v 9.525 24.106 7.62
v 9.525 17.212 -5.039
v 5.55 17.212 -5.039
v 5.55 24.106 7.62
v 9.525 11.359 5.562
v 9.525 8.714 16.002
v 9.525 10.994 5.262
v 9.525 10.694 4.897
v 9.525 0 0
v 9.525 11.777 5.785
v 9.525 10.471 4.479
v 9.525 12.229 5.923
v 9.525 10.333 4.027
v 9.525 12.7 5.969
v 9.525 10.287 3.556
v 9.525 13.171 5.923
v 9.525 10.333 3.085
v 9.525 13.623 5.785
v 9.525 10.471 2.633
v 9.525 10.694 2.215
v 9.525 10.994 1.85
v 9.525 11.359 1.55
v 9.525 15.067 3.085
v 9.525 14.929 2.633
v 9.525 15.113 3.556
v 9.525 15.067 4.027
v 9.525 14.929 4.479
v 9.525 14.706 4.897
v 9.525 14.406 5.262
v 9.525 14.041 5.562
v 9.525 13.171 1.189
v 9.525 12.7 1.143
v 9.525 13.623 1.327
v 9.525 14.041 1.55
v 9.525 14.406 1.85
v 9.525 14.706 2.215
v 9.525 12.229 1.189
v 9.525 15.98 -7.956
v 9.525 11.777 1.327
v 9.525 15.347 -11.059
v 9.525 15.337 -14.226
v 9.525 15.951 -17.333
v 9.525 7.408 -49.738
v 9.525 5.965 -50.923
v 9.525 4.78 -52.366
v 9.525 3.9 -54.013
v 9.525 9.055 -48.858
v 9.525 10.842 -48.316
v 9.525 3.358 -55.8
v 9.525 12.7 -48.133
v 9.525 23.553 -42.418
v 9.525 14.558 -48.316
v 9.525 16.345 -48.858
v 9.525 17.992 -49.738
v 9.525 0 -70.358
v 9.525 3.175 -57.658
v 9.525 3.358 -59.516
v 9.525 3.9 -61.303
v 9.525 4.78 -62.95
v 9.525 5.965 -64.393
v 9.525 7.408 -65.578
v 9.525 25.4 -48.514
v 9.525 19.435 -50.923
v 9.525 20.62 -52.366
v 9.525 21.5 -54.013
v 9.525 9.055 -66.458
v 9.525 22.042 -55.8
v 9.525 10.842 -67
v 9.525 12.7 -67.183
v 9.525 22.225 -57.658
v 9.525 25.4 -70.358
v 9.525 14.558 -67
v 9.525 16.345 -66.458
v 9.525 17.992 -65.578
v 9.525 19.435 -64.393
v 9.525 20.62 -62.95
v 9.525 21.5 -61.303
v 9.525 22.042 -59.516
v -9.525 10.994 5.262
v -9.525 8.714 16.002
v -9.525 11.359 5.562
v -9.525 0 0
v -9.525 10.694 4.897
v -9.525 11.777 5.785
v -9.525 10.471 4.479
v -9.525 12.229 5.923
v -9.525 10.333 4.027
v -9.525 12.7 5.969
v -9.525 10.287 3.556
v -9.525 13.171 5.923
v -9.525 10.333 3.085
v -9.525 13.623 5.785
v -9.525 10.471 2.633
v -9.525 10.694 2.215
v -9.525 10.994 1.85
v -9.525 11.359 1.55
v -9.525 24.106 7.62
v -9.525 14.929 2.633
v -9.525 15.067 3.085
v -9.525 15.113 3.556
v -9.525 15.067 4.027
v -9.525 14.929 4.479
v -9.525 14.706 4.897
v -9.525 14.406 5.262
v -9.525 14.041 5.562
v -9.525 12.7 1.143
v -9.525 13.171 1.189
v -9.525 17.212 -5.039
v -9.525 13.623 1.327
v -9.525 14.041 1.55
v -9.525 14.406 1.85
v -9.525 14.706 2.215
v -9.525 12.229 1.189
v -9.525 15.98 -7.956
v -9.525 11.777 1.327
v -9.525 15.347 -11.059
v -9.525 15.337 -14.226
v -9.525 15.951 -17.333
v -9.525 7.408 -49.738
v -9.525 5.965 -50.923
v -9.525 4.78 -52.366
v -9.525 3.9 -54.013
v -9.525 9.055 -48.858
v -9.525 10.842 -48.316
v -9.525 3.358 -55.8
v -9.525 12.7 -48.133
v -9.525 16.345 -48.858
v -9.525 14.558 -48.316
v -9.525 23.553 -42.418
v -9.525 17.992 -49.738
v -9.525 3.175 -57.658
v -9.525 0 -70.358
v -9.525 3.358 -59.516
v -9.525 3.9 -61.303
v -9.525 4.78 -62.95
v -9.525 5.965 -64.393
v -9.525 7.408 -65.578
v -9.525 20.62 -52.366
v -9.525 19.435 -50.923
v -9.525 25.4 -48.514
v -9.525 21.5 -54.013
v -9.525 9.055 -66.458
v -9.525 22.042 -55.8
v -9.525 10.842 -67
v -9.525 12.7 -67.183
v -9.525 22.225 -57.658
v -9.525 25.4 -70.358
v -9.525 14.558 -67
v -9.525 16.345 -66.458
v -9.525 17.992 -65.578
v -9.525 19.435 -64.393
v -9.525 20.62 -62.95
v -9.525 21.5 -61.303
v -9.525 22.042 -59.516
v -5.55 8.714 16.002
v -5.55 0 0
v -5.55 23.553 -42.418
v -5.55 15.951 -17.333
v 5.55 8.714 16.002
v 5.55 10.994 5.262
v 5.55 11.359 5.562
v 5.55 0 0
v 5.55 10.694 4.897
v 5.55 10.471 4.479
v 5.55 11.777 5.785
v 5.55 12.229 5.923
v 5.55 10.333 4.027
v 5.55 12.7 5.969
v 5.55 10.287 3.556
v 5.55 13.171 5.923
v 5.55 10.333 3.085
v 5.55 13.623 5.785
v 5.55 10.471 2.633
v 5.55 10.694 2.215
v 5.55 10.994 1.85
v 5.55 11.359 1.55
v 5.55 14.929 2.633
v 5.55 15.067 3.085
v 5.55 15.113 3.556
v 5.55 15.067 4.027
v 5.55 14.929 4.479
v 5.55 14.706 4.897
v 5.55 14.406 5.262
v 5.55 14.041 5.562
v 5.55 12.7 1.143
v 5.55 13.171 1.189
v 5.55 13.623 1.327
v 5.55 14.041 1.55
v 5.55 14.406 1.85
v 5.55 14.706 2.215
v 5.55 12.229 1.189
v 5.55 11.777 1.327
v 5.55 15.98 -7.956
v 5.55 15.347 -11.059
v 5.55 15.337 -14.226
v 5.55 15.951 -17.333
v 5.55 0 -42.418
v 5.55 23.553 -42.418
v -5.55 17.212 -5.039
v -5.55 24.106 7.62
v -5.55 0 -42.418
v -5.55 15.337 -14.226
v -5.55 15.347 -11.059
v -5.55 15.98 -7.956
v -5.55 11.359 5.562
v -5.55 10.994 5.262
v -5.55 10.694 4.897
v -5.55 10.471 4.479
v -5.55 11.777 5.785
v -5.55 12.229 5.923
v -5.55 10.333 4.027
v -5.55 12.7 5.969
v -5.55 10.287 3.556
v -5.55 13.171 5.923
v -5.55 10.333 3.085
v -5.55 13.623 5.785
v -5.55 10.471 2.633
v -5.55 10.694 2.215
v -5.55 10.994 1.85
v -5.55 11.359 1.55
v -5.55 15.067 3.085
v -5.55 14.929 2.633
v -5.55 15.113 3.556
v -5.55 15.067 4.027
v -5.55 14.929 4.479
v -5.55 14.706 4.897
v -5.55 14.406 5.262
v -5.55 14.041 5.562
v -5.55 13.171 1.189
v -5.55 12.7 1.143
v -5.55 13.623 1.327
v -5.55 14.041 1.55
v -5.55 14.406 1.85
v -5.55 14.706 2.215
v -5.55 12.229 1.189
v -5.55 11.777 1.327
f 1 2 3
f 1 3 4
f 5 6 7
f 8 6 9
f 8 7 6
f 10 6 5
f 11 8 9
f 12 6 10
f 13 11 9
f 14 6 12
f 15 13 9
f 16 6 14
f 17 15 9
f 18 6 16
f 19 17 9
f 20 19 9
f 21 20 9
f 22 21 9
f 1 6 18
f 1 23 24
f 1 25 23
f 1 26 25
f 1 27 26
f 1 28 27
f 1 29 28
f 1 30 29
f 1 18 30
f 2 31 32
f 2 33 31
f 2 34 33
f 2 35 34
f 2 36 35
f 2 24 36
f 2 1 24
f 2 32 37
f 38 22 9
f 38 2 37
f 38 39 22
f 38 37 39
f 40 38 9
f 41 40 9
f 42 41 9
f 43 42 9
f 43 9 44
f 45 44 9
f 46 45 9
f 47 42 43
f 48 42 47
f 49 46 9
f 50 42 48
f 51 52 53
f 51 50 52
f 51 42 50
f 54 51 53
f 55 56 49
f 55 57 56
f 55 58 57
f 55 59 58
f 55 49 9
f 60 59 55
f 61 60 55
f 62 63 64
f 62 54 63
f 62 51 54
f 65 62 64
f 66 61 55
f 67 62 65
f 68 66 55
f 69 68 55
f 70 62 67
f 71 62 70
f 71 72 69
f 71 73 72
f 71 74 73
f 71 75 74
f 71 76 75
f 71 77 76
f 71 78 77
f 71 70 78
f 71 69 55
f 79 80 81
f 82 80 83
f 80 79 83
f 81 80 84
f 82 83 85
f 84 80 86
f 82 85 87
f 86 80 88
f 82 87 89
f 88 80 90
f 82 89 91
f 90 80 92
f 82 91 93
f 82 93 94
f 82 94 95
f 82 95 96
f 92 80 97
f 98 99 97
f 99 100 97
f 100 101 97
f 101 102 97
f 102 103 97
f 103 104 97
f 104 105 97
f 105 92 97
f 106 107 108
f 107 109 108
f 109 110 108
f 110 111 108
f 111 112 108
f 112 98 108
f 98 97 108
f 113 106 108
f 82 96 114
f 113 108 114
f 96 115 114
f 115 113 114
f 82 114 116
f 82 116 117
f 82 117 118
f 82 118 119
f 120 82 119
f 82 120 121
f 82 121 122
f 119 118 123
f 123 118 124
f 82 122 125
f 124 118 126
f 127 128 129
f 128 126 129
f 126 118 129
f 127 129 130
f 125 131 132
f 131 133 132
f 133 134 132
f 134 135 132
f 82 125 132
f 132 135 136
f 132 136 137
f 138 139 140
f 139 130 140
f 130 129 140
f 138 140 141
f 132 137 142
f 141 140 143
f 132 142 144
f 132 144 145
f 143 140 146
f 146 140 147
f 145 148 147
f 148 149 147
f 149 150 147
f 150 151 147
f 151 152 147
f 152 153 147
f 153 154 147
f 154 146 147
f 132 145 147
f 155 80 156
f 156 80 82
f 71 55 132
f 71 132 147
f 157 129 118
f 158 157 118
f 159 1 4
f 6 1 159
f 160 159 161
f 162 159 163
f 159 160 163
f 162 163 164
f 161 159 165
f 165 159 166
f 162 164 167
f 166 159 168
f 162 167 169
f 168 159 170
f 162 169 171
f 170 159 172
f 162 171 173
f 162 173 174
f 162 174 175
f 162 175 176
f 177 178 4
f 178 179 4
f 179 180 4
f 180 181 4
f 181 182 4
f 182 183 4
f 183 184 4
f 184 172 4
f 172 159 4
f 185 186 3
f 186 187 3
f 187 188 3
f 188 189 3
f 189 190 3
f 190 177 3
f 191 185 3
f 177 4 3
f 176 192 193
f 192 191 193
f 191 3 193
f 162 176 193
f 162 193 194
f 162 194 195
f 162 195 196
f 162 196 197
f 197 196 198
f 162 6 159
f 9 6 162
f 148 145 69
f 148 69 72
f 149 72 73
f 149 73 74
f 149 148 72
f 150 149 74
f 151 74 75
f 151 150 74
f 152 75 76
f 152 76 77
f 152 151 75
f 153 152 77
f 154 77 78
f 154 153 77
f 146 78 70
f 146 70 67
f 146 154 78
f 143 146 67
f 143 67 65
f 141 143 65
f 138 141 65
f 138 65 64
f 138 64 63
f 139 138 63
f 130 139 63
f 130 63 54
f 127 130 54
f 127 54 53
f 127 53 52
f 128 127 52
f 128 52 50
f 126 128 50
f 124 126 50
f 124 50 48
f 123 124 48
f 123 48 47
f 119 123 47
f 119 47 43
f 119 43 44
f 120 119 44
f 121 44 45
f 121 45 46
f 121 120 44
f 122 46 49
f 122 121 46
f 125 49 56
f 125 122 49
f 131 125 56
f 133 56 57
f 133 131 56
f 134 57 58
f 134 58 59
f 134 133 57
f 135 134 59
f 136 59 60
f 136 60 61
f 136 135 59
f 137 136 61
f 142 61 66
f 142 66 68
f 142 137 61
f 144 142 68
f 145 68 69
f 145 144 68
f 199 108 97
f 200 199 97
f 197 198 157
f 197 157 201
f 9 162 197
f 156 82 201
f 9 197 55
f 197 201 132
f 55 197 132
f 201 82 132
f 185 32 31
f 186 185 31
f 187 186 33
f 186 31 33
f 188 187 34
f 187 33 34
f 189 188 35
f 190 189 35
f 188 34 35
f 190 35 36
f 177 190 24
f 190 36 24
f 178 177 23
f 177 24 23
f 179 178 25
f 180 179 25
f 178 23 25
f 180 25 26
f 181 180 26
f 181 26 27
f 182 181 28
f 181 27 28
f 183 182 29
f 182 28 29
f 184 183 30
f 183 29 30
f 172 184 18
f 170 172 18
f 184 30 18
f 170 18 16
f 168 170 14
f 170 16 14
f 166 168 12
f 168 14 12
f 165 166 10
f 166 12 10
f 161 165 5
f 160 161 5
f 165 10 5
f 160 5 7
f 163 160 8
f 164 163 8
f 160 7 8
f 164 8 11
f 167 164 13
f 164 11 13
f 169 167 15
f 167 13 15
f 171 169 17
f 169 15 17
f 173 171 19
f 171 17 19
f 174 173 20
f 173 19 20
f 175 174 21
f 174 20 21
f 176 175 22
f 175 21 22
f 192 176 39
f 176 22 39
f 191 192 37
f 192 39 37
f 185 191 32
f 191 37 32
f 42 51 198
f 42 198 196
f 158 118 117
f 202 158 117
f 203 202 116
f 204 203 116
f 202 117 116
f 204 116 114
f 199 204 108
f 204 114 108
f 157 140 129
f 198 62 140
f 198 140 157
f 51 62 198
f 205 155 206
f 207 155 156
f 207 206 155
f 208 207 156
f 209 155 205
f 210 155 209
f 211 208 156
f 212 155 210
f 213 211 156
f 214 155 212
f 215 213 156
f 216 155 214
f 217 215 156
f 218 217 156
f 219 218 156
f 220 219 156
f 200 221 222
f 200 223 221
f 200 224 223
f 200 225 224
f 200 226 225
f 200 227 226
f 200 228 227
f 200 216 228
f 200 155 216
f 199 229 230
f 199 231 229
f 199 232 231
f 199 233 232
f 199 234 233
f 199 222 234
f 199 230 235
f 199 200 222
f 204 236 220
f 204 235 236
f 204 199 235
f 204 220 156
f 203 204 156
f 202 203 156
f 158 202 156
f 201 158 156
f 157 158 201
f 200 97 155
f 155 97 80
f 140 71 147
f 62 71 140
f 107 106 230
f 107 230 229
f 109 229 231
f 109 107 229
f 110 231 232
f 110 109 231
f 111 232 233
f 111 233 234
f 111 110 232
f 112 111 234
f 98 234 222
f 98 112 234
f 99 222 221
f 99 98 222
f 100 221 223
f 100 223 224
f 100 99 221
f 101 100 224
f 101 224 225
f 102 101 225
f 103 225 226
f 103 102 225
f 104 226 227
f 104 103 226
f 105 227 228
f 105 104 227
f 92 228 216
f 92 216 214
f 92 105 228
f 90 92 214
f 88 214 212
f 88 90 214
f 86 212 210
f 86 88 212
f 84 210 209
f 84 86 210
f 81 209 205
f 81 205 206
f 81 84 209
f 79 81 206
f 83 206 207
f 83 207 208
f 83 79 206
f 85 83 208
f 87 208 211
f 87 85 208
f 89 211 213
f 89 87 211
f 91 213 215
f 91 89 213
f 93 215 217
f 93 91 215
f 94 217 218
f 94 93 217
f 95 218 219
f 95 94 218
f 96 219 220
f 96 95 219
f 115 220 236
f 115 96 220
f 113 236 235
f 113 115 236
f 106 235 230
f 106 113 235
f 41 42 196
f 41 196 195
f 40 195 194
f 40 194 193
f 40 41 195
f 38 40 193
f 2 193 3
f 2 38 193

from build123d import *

# Parameters (mm, degrees)
SKETCH1_R           = 9.525
BOSS_EXTRUDE1_DEPTH = 9.525
BOSS_EXTRUDE2_START = 9.525
SKETCH1_4_R         = 9.525
SKETCH1_4_R_2       = 2.413
BOSS_EXTRUDE2_DEPTH = 3.9751
BOSS_EXTRUDE3_START = -9.525
SKETCH1_5_R         = 9.525
SKETCH1_5_R_2       = 2.413
BOSS_EXTRUDE3_DEPTH = 3.9751


with BuildPart() as part:
    # Sketch1 → Boss-Extrude1 (new body, symmetric)
    with BuildSketch(Plane(origin=(0, 0, 0), x_dir=(0, 0, -1), z_dir=(1, 0, 0))):
        Polygon((42.418, 23.552715039), (42.418, 0), (70.358, 0), (70.358, 25.4), (48.514, 25.4), align=None)
        with Locations((57.658, 12.7)):
            Circle(SKETCH1_R, mode=Mode.SUBTRACT)
    extrude(amount=BOSS_EXTRUDE1_DEPTH, both=True)

    # Sketch1<4> → Boss-Extrude2 (add)
    with BuildSketch(Plane(origin=(0, 0, 0), x_dir=(0, 0, -1), z_dir=(1, 0, 0)).offset(BOSS_EXTRUDE2_START)):
        with BuildLine():
            Line((0, 0), (70.358, 0))
            Line((70.358, 0), (70.358, 25.4))
            Line((70.358, 25.4), (48.514, 25.4))
            Line((48.514, 25.4), (17.332880156, 15.95111323))
            ThreePointArc((17.332880156, 15.95111323), (11.05930066, 15.346935831), (5.039023234, 17.212167653))
            Line((5.039023234, 17.212167653), (-7.62, 24.106033067))
            Line((-7.62, 24.106033067), (-16.002, 8.71438754))
            Line((-16.002, 8.71438754), (0, 0))
        make_face()
        with Locations((57.658, 12.7)):
            Circle(SKETCH1_4_R, mode=Mode.SUBTRACT)
        with Locations((-3.556, 12.7)):
            Circle(SKETCH1_4_R_2, mode=Mode.SUBTRACT)
    extrude(amount=-BOSS_EXTRUDE2_DEPTH)

    # Sketch1<5> → Boss-Extrude3 (add)
    with BuildSketch(Plane(origin=(0, 0, 0), x_dir=(0, 0, -1), z_dir=(1, 0, 0)).offset(BOSS_EXTRUDE3_START)):
        with BuildLine():
            Line((0, 0), (70.358, 0))
            Line((70.358, 0), (70.358, 25.4))
            Line((70.358, 25.4), (48.514, 25.4))
            Line((48.514, 25.4), (17.332880156, 15.95111323))
            ThreePointArc((17.332880156, 15.95111323), (11.05930066, 15.346935831), (5.039023234, 17.212167653))
            Line((5.039023234, 17.212167653), (-7.62, 24.106033067))
            Line((-7.62, 24.106033067), (-16.002, 8.71438754))
            Line((-16.002, 8.71438754), (0, 0))
        make_face()
        with Locations((57.658, 12.7)):
            Circle(SKETCH1_5_R, mode=Mode.SUBTRACT)
        with Locations((-3.556, 12.7)):
            Circle(SKETCH1_5_R_2, mode=Mode.SUBTRACT)
    extrude(amount=BOSS_EXTRUDE3_DEPTH)


solid = part.part
